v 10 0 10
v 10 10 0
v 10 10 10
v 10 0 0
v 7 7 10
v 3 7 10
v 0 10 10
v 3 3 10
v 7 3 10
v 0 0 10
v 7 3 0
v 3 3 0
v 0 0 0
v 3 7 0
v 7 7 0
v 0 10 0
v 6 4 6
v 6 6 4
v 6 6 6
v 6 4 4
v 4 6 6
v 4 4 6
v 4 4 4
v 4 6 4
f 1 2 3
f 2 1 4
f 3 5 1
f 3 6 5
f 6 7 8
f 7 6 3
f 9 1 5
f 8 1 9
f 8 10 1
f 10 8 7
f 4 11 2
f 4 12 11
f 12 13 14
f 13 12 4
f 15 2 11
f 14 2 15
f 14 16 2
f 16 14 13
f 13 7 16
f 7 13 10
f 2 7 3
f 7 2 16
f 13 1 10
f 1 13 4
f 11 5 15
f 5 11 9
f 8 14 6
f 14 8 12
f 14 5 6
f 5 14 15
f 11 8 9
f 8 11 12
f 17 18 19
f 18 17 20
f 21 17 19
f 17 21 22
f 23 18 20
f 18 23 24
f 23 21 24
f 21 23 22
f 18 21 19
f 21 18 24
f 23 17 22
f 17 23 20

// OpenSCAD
// file: ../openscad/csg.scad
//////////////////////////////////////////////////////////////////////
// LibFile: csg.scad
//   Tagged constructive-solid-geometry helpers.
//////////////////////////////////////////////////////////////////////


// Module: fg_tag()
// Synopsis: Marks geometry with a Forge CSG role.
// Arguments:
//   tag = One of "body", "remove" or "keep".
module fg_tag(tag) {
    assert(
        tag == "body"
            || tag == "remove"
            || tag == "keep",
        str("Unsupported Forge tag: ", tag)
    );

    if (
        is_undef($fg_role)
        || $fg_role == "all"
        || $fg_role == tag
    )
        children();
}


// Module: fg_body()
// Synopsis: Marks positive/base geometry for fg_diff().
module fg_body() {
    fg_tag("body")
        children();
}


// Module: fg_remove()
// Synopsis: Marks geometry subtracted by fg_diff().
module fg_remove() {
    fg_tag("remove")
        children();
}


// Module: fg_keep()
// Synopsis: Marks geometry unioned back after fg_diff().
module fg_keep() {
    fg_tag("keep")
        children();
}


// Module: fg_diff()
// Synopsis: Performs an explicit body/remove/keep tagged difference.
// Description:
//   The result is (body - remove) + keep. Participating geometry should pass
//   through fg_body(), fg_remove(), fg_keep() or fg_tag().
module fg_diff() {
    union() {
        difference() {
            let($fg_role = "body")
                children();

            let($fg_role = "remove")
                children();
        }

        let($fg_role = "keep")
            children();
    }
}
// main file
use <../openscad/csg.scad>

fg_diff() {
    fg_body()
        cube([10, 10, 10]);

    fg_remove()
        translate([3, 3, -1])
            cube([4, 4, 12]);

    fg_keep()
        translate([4, 4, 4])
            cube([2, 2, 2]);
}
